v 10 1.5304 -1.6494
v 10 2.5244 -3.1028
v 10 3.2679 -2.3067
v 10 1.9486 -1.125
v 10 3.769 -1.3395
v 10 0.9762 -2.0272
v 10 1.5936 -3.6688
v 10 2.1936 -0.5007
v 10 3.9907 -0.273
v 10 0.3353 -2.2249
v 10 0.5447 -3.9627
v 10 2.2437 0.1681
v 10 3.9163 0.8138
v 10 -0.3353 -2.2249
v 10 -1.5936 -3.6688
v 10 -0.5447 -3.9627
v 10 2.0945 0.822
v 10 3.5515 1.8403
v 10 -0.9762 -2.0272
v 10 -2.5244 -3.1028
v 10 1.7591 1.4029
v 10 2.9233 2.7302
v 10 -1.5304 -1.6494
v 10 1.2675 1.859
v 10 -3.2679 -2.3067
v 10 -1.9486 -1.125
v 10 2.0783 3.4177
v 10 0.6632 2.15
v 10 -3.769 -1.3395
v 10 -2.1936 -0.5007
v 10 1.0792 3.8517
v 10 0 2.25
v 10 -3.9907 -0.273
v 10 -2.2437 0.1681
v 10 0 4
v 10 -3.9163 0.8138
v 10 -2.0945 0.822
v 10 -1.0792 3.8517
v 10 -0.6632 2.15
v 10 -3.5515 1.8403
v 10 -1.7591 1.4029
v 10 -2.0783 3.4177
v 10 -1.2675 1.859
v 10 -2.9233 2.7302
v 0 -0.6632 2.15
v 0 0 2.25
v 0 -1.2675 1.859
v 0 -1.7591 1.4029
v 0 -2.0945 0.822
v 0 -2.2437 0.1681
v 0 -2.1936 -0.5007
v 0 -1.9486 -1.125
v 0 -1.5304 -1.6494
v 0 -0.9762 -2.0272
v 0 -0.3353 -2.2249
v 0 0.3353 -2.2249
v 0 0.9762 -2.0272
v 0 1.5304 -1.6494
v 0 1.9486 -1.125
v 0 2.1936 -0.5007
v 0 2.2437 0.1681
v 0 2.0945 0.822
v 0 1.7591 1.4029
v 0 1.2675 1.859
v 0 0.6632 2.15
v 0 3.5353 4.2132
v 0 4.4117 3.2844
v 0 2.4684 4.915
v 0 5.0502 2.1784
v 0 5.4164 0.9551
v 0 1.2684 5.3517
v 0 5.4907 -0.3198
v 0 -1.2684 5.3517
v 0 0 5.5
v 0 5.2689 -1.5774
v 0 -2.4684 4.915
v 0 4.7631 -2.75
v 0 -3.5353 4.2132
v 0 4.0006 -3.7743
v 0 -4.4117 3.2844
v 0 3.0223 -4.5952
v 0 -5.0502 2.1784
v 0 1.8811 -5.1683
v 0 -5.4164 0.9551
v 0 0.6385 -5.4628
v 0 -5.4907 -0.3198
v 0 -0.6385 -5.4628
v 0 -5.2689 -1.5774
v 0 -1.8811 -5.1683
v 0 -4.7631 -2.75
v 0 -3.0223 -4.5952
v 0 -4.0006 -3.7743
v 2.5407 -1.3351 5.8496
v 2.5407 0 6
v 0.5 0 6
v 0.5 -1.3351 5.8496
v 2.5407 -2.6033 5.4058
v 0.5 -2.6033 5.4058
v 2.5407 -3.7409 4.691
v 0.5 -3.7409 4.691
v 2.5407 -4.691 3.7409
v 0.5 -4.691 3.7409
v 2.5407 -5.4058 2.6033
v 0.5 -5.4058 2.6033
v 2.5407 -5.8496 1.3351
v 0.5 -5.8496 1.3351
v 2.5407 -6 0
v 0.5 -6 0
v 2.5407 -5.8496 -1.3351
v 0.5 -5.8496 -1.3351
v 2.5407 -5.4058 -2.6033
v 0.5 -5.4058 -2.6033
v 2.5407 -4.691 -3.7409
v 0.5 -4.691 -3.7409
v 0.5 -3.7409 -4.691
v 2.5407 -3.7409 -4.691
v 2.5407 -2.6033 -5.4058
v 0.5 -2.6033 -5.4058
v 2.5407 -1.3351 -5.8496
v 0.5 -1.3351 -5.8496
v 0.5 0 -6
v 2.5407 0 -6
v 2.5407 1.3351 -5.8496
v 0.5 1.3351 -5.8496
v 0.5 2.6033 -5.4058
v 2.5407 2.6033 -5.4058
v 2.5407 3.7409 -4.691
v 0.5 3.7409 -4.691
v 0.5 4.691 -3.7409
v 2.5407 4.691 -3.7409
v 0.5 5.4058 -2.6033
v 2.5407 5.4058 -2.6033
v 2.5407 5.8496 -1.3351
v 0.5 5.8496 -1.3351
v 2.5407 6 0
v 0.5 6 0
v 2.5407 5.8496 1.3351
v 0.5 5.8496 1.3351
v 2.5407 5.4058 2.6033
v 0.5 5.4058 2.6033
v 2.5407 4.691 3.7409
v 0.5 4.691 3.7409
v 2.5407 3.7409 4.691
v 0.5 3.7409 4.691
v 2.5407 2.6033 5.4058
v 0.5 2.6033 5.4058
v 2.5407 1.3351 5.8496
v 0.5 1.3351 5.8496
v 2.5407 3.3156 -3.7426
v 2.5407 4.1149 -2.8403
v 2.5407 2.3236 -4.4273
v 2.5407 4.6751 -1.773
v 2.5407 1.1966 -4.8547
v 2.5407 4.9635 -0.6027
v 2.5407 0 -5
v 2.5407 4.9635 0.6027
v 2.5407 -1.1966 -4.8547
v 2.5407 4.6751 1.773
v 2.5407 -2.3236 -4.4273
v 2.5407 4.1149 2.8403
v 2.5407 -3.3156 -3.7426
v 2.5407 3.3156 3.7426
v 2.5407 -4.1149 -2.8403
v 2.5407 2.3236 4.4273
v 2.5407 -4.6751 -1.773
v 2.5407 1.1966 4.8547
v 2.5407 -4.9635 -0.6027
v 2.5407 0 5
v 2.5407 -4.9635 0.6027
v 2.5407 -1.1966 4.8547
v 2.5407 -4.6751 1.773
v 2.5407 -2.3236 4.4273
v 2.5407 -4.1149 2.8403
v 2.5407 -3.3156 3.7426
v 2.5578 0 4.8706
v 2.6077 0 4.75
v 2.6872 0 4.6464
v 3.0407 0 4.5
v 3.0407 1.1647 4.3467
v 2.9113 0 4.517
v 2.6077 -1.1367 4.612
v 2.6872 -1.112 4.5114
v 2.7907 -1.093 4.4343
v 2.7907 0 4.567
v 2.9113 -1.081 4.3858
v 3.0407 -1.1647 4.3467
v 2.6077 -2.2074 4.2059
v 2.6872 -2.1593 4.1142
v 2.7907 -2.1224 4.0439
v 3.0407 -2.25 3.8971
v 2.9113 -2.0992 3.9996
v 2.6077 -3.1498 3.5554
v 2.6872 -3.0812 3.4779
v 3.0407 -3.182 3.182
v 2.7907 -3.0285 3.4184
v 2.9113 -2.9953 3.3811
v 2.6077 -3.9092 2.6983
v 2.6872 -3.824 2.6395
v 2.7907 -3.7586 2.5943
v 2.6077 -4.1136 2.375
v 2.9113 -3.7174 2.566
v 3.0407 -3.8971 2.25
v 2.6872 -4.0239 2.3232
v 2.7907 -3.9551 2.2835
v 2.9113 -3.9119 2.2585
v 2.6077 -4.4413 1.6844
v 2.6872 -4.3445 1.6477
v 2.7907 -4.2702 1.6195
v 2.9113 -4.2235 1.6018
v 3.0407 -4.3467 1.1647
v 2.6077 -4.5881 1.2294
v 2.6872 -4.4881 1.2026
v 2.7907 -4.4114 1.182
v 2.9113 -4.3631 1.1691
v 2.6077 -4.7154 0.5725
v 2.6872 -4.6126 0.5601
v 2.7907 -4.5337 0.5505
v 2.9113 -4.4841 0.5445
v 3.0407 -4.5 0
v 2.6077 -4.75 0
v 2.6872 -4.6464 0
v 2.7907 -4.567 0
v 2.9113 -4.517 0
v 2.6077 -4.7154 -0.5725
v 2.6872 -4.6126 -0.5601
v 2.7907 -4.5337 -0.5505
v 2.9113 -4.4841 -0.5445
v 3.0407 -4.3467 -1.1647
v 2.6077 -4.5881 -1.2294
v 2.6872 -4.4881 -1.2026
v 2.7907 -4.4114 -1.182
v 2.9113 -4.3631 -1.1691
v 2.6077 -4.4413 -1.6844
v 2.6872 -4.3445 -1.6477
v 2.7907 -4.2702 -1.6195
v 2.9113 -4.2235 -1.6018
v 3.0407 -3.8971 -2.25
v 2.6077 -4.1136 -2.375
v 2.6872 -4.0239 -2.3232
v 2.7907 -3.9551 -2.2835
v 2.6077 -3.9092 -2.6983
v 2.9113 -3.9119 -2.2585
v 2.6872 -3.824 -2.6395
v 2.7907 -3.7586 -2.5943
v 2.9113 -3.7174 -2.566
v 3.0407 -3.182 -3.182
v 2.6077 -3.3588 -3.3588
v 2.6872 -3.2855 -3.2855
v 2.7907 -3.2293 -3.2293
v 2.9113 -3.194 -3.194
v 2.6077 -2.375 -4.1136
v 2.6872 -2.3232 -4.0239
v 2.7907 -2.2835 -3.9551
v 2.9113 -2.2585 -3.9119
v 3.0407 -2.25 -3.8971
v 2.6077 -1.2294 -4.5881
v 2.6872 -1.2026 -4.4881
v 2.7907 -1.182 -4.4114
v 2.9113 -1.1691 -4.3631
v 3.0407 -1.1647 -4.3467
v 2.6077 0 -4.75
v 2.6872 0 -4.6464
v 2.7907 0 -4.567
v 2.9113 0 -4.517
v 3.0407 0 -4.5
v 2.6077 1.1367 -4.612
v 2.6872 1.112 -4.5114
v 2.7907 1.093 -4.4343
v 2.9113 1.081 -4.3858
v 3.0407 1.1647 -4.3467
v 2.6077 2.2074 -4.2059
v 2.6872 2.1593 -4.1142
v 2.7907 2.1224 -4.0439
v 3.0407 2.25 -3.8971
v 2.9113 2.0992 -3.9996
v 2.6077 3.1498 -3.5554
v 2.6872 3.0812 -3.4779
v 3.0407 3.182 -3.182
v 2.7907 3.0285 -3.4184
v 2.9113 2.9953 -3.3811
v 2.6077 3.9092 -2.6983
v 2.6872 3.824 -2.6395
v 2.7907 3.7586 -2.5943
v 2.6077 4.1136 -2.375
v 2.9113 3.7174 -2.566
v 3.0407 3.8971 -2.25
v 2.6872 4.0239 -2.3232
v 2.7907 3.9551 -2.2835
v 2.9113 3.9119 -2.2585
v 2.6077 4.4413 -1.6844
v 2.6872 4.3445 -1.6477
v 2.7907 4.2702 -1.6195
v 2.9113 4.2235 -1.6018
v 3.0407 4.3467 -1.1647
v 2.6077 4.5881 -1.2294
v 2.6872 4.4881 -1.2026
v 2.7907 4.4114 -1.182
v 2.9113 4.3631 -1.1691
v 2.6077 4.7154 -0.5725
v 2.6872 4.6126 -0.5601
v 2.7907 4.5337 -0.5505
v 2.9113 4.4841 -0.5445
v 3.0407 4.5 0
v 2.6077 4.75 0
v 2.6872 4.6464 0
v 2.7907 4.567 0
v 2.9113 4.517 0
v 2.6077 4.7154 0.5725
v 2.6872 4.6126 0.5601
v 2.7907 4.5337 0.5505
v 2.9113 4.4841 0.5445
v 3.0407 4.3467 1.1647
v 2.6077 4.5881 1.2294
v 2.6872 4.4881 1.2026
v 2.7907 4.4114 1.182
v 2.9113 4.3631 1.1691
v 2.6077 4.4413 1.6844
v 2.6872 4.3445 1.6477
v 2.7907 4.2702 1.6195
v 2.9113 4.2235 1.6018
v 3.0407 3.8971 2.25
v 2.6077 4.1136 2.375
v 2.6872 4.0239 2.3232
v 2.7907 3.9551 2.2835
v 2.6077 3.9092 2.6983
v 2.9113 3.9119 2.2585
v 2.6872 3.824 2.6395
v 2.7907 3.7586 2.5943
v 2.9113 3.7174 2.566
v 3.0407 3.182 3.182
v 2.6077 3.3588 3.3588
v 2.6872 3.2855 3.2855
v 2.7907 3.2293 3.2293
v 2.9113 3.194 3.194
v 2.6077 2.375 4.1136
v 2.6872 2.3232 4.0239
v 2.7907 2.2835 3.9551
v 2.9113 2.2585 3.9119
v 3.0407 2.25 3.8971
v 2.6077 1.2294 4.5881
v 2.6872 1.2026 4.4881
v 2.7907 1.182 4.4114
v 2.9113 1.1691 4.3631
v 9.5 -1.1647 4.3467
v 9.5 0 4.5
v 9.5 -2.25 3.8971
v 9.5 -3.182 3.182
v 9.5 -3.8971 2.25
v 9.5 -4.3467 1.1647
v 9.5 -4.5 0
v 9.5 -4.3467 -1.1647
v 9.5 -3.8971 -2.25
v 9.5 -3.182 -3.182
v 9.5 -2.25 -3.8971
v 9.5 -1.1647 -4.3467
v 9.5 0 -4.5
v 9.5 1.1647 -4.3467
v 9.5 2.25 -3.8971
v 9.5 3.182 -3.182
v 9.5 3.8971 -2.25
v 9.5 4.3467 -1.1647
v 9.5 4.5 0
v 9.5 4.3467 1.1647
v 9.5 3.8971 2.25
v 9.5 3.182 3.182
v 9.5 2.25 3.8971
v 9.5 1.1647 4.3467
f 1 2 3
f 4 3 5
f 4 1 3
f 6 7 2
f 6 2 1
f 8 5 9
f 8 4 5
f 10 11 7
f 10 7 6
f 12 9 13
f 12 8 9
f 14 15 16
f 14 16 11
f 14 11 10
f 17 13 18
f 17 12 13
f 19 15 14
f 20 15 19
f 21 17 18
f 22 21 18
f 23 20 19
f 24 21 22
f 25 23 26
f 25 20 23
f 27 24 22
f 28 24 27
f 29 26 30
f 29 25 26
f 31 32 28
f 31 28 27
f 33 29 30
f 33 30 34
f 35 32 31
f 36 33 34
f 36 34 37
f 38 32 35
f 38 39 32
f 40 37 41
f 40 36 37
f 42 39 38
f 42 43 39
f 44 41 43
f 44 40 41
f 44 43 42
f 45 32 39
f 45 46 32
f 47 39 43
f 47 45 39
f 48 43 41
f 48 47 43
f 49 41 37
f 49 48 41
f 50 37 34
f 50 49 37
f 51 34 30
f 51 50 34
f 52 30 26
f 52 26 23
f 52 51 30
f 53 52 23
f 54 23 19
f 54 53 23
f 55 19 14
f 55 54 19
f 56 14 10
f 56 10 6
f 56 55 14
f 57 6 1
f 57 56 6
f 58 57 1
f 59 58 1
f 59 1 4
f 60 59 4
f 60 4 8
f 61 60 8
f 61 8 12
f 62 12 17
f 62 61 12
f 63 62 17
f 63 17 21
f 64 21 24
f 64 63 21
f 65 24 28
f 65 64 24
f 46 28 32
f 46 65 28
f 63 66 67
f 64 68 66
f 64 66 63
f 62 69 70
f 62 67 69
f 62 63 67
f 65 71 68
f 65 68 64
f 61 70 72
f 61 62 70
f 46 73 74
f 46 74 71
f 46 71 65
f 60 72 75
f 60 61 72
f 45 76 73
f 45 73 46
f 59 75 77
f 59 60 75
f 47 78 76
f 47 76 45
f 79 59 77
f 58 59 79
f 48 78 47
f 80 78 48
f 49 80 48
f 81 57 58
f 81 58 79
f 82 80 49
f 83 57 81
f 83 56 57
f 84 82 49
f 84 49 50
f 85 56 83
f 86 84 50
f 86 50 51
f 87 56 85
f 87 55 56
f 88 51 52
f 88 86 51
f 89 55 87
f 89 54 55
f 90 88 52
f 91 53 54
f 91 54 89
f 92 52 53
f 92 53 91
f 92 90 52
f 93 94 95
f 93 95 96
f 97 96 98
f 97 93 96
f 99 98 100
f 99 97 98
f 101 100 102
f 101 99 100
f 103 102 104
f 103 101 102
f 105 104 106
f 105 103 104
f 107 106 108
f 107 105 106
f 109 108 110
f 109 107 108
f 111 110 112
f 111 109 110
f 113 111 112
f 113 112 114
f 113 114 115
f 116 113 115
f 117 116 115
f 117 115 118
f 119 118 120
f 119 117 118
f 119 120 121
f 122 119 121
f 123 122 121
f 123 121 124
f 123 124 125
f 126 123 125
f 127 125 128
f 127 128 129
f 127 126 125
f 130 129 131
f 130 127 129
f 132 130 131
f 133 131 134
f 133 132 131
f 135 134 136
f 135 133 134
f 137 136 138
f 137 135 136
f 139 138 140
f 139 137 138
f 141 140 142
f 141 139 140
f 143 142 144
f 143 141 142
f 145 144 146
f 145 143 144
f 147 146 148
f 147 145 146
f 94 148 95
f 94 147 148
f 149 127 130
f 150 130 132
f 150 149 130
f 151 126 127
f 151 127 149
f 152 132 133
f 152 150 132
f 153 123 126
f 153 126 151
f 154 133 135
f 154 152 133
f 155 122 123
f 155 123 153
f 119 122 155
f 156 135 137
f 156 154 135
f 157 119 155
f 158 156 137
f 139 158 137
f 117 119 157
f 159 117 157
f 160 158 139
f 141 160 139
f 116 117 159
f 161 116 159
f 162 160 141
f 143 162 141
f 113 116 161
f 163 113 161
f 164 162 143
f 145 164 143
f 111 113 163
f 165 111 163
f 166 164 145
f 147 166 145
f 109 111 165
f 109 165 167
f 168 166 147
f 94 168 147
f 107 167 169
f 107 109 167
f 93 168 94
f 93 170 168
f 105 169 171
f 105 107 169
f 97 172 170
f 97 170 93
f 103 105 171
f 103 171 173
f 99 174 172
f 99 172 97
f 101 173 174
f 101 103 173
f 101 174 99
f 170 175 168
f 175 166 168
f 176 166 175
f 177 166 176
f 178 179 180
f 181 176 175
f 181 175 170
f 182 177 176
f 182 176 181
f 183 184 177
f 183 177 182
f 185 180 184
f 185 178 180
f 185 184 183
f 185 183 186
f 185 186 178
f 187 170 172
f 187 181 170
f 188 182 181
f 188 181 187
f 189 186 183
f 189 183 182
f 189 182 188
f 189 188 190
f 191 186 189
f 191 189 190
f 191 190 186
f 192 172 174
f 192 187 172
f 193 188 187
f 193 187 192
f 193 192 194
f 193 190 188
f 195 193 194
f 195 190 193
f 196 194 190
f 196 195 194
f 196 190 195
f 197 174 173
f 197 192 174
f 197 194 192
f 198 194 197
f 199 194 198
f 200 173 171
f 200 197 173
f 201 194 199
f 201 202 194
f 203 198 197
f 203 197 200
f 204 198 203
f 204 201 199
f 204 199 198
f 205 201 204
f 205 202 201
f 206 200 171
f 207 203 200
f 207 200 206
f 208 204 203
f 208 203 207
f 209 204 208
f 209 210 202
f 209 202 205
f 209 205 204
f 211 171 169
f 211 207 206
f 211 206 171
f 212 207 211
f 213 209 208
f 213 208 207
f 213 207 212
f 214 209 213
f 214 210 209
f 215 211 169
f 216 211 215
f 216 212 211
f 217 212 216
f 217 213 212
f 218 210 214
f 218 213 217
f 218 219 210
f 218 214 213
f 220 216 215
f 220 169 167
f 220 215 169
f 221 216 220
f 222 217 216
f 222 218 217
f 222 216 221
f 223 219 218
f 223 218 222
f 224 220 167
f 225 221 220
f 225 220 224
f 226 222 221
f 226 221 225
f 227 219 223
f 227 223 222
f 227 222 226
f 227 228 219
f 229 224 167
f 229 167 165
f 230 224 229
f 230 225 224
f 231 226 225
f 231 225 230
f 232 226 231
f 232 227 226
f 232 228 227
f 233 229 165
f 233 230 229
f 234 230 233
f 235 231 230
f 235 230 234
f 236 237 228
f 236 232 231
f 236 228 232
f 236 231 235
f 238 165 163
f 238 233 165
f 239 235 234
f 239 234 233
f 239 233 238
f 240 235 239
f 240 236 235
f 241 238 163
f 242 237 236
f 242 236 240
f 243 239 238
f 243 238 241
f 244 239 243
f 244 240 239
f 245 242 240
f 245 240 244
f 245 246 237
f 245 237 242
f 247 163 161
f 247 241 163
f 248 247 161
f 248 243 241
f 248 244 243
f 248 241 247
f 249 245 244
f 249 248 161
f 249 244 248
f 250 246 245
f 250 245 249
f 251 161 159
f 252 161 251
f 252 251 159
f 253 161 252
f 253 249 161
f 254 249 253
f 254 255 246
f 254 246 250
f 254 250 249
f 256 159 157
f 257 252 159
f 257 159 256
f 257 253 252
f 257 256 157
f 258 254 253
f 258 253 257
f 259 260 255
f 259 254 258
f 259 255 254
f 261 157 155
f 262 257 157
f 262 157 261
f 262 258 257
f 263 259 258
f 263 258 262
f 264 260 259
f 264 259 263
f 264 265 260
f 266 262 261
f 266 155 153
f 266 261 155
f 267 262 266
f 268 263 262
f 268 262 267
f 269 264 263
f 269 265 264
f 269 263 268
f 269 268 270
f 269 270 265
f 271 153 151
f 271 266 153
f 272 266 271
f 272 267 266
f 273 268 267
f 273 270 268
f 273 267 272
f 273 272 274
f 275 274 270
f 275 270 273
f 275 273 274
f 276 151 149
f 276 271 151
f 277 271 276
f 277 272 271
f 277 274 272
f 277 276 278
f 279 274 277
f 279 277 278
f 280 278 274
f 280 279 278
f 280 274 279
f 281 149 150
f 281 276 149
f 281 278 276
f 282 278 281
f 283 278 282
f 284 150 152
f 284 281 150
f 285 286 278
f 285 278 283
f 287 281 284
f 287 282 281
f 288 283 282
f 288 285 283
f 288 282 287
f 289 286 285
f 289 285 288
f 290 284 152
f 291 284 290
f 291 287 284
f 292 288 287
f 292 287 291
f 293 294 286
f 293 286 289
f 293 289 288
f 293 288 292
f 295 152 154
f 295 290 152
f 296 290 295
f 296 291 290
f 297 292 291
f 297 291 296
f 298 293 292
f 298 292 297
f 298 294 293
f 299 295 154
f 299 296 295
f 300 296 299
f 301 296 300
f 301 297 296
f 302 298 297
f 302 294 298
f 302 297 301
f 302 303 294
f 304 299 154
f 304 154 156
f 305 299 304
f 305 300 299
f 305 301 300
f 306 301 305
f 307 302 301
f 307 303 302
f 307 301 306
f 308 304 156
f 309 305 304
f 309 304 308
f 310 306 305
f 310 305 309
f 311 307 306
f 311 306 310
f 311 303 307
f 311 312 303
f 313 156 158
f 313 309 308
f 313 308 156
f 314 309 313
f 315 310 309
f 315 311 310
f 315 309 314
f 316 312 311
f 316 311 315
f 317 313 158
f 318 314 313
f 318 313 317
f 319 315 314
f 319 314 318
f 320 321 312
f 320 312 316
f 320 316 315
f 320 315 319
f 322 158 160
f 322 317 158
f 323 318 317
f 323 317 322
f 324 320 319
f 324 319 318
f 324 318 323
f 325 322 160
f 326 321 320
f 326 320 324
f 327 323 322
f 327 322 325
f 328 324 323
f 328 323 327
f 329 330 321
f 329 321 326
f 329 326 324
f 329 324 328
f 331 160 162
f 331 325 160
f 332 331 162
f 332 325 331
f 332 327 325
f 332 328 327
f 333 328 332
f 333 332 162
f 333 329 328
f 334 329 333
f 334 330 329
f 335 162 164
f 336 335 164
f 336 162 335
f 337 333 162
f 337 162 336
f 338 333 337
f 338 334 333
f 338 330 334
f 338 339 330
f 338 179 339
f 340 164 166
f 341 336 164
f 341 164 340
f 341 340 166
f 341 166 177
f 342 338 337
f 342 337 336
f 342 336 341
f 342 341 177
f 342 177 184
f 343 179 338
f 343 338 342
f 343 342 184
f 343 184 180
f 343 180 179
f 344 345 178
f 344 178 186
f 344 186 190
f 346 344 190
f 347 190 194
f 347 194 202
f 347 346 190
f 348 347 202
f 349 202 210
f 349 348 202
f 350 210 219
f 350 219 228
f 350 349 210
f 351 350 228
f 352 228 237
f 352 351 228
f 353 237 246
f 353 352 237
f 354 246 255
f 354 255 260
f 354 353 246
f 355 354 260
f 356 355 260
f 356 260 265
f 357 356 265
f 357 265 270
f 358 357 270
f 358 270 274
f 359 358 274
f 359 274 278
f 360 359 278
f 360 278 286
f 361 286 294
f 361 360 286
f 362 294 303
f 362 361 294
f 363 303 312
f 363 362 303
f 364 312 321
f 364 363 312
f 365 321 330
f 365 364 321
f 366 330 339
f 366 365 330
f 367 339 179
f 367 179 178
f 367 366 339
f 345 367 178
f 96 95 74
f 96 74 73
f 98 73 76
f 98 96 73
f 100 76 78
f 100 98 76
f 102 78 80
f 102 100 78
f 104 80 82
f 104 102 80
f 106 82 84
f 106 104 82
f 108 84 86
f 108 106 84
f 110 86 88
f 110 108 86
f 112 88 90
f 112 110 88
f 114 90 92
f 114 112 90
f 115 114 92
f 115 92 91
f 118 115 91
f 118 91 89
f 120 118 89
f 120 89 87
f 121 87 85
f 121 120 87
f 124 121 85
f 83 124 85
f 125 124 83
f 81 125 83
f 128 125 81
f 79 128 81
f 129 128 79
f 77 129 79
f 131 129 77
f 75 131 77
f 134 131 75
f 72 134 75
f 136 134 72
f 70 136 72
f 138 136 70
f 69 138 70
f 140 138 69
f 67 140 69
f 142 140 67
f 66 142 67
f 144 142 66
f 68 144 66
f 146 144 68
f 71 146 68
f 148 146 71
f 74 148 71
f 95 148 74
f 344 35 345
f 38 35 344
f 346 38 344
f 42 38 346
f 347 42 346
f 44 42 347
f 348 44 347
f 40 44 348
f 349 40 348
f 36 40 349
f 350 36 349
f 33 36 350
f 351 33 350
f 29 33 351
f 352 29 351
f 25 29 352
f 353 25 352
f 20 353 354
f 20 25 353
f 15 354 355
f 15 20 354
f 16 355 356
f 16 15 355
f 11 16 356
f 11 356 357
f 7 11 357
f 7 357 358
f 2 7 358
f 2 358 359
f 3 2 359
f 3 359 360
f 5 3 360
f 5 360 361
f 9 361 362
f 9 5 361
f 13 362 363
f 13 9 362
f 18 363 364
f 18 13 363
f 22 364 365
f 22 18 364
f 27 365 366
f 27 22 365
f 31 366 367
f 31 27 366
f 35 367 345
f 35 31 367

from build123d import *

# Parameters (mm, degrees)
CHAMFER1_SIZE = 0.5
FILLET1_R     = 0.5


with BuildPart() as part:
    # Sketch1 → Revolve1 (revolve)
    with BuildSketch(Plane.XY, mode=Mode.PRIVATE) as revolve1_sk:
        Polygon((0, 2.25), (0, 6), (2.540716612, 6), (2.540716612, 4.5), (10, 4.5), (10, 2.25), align=None)
    revolve(revolve1_sk.sketch.rotate(Axis((-1.743486548, 0, 0), (1, 0, 0)), 90), axis=Axis((-1.743486548, 0, 0), (1, 0, 0)))

    # Chamfer1
    chamfer1_edges = [part.edges().sort_by_distance(p)[0] for p in [
        (10, 0, -4.5),
        (0, 0, -6),
    ]]
    chamfer(chamfer1_edges, length=CHAMFER1_SIZE)

    # Fillet1
    fillet1_edges = [part.edges().sort_by_distance(p)[0] for p in [
        (2.540716612, 0, -4.5),
    ]]
    fillet(fillet1_edges, radius=FILLET1_R)


solid = part.part
